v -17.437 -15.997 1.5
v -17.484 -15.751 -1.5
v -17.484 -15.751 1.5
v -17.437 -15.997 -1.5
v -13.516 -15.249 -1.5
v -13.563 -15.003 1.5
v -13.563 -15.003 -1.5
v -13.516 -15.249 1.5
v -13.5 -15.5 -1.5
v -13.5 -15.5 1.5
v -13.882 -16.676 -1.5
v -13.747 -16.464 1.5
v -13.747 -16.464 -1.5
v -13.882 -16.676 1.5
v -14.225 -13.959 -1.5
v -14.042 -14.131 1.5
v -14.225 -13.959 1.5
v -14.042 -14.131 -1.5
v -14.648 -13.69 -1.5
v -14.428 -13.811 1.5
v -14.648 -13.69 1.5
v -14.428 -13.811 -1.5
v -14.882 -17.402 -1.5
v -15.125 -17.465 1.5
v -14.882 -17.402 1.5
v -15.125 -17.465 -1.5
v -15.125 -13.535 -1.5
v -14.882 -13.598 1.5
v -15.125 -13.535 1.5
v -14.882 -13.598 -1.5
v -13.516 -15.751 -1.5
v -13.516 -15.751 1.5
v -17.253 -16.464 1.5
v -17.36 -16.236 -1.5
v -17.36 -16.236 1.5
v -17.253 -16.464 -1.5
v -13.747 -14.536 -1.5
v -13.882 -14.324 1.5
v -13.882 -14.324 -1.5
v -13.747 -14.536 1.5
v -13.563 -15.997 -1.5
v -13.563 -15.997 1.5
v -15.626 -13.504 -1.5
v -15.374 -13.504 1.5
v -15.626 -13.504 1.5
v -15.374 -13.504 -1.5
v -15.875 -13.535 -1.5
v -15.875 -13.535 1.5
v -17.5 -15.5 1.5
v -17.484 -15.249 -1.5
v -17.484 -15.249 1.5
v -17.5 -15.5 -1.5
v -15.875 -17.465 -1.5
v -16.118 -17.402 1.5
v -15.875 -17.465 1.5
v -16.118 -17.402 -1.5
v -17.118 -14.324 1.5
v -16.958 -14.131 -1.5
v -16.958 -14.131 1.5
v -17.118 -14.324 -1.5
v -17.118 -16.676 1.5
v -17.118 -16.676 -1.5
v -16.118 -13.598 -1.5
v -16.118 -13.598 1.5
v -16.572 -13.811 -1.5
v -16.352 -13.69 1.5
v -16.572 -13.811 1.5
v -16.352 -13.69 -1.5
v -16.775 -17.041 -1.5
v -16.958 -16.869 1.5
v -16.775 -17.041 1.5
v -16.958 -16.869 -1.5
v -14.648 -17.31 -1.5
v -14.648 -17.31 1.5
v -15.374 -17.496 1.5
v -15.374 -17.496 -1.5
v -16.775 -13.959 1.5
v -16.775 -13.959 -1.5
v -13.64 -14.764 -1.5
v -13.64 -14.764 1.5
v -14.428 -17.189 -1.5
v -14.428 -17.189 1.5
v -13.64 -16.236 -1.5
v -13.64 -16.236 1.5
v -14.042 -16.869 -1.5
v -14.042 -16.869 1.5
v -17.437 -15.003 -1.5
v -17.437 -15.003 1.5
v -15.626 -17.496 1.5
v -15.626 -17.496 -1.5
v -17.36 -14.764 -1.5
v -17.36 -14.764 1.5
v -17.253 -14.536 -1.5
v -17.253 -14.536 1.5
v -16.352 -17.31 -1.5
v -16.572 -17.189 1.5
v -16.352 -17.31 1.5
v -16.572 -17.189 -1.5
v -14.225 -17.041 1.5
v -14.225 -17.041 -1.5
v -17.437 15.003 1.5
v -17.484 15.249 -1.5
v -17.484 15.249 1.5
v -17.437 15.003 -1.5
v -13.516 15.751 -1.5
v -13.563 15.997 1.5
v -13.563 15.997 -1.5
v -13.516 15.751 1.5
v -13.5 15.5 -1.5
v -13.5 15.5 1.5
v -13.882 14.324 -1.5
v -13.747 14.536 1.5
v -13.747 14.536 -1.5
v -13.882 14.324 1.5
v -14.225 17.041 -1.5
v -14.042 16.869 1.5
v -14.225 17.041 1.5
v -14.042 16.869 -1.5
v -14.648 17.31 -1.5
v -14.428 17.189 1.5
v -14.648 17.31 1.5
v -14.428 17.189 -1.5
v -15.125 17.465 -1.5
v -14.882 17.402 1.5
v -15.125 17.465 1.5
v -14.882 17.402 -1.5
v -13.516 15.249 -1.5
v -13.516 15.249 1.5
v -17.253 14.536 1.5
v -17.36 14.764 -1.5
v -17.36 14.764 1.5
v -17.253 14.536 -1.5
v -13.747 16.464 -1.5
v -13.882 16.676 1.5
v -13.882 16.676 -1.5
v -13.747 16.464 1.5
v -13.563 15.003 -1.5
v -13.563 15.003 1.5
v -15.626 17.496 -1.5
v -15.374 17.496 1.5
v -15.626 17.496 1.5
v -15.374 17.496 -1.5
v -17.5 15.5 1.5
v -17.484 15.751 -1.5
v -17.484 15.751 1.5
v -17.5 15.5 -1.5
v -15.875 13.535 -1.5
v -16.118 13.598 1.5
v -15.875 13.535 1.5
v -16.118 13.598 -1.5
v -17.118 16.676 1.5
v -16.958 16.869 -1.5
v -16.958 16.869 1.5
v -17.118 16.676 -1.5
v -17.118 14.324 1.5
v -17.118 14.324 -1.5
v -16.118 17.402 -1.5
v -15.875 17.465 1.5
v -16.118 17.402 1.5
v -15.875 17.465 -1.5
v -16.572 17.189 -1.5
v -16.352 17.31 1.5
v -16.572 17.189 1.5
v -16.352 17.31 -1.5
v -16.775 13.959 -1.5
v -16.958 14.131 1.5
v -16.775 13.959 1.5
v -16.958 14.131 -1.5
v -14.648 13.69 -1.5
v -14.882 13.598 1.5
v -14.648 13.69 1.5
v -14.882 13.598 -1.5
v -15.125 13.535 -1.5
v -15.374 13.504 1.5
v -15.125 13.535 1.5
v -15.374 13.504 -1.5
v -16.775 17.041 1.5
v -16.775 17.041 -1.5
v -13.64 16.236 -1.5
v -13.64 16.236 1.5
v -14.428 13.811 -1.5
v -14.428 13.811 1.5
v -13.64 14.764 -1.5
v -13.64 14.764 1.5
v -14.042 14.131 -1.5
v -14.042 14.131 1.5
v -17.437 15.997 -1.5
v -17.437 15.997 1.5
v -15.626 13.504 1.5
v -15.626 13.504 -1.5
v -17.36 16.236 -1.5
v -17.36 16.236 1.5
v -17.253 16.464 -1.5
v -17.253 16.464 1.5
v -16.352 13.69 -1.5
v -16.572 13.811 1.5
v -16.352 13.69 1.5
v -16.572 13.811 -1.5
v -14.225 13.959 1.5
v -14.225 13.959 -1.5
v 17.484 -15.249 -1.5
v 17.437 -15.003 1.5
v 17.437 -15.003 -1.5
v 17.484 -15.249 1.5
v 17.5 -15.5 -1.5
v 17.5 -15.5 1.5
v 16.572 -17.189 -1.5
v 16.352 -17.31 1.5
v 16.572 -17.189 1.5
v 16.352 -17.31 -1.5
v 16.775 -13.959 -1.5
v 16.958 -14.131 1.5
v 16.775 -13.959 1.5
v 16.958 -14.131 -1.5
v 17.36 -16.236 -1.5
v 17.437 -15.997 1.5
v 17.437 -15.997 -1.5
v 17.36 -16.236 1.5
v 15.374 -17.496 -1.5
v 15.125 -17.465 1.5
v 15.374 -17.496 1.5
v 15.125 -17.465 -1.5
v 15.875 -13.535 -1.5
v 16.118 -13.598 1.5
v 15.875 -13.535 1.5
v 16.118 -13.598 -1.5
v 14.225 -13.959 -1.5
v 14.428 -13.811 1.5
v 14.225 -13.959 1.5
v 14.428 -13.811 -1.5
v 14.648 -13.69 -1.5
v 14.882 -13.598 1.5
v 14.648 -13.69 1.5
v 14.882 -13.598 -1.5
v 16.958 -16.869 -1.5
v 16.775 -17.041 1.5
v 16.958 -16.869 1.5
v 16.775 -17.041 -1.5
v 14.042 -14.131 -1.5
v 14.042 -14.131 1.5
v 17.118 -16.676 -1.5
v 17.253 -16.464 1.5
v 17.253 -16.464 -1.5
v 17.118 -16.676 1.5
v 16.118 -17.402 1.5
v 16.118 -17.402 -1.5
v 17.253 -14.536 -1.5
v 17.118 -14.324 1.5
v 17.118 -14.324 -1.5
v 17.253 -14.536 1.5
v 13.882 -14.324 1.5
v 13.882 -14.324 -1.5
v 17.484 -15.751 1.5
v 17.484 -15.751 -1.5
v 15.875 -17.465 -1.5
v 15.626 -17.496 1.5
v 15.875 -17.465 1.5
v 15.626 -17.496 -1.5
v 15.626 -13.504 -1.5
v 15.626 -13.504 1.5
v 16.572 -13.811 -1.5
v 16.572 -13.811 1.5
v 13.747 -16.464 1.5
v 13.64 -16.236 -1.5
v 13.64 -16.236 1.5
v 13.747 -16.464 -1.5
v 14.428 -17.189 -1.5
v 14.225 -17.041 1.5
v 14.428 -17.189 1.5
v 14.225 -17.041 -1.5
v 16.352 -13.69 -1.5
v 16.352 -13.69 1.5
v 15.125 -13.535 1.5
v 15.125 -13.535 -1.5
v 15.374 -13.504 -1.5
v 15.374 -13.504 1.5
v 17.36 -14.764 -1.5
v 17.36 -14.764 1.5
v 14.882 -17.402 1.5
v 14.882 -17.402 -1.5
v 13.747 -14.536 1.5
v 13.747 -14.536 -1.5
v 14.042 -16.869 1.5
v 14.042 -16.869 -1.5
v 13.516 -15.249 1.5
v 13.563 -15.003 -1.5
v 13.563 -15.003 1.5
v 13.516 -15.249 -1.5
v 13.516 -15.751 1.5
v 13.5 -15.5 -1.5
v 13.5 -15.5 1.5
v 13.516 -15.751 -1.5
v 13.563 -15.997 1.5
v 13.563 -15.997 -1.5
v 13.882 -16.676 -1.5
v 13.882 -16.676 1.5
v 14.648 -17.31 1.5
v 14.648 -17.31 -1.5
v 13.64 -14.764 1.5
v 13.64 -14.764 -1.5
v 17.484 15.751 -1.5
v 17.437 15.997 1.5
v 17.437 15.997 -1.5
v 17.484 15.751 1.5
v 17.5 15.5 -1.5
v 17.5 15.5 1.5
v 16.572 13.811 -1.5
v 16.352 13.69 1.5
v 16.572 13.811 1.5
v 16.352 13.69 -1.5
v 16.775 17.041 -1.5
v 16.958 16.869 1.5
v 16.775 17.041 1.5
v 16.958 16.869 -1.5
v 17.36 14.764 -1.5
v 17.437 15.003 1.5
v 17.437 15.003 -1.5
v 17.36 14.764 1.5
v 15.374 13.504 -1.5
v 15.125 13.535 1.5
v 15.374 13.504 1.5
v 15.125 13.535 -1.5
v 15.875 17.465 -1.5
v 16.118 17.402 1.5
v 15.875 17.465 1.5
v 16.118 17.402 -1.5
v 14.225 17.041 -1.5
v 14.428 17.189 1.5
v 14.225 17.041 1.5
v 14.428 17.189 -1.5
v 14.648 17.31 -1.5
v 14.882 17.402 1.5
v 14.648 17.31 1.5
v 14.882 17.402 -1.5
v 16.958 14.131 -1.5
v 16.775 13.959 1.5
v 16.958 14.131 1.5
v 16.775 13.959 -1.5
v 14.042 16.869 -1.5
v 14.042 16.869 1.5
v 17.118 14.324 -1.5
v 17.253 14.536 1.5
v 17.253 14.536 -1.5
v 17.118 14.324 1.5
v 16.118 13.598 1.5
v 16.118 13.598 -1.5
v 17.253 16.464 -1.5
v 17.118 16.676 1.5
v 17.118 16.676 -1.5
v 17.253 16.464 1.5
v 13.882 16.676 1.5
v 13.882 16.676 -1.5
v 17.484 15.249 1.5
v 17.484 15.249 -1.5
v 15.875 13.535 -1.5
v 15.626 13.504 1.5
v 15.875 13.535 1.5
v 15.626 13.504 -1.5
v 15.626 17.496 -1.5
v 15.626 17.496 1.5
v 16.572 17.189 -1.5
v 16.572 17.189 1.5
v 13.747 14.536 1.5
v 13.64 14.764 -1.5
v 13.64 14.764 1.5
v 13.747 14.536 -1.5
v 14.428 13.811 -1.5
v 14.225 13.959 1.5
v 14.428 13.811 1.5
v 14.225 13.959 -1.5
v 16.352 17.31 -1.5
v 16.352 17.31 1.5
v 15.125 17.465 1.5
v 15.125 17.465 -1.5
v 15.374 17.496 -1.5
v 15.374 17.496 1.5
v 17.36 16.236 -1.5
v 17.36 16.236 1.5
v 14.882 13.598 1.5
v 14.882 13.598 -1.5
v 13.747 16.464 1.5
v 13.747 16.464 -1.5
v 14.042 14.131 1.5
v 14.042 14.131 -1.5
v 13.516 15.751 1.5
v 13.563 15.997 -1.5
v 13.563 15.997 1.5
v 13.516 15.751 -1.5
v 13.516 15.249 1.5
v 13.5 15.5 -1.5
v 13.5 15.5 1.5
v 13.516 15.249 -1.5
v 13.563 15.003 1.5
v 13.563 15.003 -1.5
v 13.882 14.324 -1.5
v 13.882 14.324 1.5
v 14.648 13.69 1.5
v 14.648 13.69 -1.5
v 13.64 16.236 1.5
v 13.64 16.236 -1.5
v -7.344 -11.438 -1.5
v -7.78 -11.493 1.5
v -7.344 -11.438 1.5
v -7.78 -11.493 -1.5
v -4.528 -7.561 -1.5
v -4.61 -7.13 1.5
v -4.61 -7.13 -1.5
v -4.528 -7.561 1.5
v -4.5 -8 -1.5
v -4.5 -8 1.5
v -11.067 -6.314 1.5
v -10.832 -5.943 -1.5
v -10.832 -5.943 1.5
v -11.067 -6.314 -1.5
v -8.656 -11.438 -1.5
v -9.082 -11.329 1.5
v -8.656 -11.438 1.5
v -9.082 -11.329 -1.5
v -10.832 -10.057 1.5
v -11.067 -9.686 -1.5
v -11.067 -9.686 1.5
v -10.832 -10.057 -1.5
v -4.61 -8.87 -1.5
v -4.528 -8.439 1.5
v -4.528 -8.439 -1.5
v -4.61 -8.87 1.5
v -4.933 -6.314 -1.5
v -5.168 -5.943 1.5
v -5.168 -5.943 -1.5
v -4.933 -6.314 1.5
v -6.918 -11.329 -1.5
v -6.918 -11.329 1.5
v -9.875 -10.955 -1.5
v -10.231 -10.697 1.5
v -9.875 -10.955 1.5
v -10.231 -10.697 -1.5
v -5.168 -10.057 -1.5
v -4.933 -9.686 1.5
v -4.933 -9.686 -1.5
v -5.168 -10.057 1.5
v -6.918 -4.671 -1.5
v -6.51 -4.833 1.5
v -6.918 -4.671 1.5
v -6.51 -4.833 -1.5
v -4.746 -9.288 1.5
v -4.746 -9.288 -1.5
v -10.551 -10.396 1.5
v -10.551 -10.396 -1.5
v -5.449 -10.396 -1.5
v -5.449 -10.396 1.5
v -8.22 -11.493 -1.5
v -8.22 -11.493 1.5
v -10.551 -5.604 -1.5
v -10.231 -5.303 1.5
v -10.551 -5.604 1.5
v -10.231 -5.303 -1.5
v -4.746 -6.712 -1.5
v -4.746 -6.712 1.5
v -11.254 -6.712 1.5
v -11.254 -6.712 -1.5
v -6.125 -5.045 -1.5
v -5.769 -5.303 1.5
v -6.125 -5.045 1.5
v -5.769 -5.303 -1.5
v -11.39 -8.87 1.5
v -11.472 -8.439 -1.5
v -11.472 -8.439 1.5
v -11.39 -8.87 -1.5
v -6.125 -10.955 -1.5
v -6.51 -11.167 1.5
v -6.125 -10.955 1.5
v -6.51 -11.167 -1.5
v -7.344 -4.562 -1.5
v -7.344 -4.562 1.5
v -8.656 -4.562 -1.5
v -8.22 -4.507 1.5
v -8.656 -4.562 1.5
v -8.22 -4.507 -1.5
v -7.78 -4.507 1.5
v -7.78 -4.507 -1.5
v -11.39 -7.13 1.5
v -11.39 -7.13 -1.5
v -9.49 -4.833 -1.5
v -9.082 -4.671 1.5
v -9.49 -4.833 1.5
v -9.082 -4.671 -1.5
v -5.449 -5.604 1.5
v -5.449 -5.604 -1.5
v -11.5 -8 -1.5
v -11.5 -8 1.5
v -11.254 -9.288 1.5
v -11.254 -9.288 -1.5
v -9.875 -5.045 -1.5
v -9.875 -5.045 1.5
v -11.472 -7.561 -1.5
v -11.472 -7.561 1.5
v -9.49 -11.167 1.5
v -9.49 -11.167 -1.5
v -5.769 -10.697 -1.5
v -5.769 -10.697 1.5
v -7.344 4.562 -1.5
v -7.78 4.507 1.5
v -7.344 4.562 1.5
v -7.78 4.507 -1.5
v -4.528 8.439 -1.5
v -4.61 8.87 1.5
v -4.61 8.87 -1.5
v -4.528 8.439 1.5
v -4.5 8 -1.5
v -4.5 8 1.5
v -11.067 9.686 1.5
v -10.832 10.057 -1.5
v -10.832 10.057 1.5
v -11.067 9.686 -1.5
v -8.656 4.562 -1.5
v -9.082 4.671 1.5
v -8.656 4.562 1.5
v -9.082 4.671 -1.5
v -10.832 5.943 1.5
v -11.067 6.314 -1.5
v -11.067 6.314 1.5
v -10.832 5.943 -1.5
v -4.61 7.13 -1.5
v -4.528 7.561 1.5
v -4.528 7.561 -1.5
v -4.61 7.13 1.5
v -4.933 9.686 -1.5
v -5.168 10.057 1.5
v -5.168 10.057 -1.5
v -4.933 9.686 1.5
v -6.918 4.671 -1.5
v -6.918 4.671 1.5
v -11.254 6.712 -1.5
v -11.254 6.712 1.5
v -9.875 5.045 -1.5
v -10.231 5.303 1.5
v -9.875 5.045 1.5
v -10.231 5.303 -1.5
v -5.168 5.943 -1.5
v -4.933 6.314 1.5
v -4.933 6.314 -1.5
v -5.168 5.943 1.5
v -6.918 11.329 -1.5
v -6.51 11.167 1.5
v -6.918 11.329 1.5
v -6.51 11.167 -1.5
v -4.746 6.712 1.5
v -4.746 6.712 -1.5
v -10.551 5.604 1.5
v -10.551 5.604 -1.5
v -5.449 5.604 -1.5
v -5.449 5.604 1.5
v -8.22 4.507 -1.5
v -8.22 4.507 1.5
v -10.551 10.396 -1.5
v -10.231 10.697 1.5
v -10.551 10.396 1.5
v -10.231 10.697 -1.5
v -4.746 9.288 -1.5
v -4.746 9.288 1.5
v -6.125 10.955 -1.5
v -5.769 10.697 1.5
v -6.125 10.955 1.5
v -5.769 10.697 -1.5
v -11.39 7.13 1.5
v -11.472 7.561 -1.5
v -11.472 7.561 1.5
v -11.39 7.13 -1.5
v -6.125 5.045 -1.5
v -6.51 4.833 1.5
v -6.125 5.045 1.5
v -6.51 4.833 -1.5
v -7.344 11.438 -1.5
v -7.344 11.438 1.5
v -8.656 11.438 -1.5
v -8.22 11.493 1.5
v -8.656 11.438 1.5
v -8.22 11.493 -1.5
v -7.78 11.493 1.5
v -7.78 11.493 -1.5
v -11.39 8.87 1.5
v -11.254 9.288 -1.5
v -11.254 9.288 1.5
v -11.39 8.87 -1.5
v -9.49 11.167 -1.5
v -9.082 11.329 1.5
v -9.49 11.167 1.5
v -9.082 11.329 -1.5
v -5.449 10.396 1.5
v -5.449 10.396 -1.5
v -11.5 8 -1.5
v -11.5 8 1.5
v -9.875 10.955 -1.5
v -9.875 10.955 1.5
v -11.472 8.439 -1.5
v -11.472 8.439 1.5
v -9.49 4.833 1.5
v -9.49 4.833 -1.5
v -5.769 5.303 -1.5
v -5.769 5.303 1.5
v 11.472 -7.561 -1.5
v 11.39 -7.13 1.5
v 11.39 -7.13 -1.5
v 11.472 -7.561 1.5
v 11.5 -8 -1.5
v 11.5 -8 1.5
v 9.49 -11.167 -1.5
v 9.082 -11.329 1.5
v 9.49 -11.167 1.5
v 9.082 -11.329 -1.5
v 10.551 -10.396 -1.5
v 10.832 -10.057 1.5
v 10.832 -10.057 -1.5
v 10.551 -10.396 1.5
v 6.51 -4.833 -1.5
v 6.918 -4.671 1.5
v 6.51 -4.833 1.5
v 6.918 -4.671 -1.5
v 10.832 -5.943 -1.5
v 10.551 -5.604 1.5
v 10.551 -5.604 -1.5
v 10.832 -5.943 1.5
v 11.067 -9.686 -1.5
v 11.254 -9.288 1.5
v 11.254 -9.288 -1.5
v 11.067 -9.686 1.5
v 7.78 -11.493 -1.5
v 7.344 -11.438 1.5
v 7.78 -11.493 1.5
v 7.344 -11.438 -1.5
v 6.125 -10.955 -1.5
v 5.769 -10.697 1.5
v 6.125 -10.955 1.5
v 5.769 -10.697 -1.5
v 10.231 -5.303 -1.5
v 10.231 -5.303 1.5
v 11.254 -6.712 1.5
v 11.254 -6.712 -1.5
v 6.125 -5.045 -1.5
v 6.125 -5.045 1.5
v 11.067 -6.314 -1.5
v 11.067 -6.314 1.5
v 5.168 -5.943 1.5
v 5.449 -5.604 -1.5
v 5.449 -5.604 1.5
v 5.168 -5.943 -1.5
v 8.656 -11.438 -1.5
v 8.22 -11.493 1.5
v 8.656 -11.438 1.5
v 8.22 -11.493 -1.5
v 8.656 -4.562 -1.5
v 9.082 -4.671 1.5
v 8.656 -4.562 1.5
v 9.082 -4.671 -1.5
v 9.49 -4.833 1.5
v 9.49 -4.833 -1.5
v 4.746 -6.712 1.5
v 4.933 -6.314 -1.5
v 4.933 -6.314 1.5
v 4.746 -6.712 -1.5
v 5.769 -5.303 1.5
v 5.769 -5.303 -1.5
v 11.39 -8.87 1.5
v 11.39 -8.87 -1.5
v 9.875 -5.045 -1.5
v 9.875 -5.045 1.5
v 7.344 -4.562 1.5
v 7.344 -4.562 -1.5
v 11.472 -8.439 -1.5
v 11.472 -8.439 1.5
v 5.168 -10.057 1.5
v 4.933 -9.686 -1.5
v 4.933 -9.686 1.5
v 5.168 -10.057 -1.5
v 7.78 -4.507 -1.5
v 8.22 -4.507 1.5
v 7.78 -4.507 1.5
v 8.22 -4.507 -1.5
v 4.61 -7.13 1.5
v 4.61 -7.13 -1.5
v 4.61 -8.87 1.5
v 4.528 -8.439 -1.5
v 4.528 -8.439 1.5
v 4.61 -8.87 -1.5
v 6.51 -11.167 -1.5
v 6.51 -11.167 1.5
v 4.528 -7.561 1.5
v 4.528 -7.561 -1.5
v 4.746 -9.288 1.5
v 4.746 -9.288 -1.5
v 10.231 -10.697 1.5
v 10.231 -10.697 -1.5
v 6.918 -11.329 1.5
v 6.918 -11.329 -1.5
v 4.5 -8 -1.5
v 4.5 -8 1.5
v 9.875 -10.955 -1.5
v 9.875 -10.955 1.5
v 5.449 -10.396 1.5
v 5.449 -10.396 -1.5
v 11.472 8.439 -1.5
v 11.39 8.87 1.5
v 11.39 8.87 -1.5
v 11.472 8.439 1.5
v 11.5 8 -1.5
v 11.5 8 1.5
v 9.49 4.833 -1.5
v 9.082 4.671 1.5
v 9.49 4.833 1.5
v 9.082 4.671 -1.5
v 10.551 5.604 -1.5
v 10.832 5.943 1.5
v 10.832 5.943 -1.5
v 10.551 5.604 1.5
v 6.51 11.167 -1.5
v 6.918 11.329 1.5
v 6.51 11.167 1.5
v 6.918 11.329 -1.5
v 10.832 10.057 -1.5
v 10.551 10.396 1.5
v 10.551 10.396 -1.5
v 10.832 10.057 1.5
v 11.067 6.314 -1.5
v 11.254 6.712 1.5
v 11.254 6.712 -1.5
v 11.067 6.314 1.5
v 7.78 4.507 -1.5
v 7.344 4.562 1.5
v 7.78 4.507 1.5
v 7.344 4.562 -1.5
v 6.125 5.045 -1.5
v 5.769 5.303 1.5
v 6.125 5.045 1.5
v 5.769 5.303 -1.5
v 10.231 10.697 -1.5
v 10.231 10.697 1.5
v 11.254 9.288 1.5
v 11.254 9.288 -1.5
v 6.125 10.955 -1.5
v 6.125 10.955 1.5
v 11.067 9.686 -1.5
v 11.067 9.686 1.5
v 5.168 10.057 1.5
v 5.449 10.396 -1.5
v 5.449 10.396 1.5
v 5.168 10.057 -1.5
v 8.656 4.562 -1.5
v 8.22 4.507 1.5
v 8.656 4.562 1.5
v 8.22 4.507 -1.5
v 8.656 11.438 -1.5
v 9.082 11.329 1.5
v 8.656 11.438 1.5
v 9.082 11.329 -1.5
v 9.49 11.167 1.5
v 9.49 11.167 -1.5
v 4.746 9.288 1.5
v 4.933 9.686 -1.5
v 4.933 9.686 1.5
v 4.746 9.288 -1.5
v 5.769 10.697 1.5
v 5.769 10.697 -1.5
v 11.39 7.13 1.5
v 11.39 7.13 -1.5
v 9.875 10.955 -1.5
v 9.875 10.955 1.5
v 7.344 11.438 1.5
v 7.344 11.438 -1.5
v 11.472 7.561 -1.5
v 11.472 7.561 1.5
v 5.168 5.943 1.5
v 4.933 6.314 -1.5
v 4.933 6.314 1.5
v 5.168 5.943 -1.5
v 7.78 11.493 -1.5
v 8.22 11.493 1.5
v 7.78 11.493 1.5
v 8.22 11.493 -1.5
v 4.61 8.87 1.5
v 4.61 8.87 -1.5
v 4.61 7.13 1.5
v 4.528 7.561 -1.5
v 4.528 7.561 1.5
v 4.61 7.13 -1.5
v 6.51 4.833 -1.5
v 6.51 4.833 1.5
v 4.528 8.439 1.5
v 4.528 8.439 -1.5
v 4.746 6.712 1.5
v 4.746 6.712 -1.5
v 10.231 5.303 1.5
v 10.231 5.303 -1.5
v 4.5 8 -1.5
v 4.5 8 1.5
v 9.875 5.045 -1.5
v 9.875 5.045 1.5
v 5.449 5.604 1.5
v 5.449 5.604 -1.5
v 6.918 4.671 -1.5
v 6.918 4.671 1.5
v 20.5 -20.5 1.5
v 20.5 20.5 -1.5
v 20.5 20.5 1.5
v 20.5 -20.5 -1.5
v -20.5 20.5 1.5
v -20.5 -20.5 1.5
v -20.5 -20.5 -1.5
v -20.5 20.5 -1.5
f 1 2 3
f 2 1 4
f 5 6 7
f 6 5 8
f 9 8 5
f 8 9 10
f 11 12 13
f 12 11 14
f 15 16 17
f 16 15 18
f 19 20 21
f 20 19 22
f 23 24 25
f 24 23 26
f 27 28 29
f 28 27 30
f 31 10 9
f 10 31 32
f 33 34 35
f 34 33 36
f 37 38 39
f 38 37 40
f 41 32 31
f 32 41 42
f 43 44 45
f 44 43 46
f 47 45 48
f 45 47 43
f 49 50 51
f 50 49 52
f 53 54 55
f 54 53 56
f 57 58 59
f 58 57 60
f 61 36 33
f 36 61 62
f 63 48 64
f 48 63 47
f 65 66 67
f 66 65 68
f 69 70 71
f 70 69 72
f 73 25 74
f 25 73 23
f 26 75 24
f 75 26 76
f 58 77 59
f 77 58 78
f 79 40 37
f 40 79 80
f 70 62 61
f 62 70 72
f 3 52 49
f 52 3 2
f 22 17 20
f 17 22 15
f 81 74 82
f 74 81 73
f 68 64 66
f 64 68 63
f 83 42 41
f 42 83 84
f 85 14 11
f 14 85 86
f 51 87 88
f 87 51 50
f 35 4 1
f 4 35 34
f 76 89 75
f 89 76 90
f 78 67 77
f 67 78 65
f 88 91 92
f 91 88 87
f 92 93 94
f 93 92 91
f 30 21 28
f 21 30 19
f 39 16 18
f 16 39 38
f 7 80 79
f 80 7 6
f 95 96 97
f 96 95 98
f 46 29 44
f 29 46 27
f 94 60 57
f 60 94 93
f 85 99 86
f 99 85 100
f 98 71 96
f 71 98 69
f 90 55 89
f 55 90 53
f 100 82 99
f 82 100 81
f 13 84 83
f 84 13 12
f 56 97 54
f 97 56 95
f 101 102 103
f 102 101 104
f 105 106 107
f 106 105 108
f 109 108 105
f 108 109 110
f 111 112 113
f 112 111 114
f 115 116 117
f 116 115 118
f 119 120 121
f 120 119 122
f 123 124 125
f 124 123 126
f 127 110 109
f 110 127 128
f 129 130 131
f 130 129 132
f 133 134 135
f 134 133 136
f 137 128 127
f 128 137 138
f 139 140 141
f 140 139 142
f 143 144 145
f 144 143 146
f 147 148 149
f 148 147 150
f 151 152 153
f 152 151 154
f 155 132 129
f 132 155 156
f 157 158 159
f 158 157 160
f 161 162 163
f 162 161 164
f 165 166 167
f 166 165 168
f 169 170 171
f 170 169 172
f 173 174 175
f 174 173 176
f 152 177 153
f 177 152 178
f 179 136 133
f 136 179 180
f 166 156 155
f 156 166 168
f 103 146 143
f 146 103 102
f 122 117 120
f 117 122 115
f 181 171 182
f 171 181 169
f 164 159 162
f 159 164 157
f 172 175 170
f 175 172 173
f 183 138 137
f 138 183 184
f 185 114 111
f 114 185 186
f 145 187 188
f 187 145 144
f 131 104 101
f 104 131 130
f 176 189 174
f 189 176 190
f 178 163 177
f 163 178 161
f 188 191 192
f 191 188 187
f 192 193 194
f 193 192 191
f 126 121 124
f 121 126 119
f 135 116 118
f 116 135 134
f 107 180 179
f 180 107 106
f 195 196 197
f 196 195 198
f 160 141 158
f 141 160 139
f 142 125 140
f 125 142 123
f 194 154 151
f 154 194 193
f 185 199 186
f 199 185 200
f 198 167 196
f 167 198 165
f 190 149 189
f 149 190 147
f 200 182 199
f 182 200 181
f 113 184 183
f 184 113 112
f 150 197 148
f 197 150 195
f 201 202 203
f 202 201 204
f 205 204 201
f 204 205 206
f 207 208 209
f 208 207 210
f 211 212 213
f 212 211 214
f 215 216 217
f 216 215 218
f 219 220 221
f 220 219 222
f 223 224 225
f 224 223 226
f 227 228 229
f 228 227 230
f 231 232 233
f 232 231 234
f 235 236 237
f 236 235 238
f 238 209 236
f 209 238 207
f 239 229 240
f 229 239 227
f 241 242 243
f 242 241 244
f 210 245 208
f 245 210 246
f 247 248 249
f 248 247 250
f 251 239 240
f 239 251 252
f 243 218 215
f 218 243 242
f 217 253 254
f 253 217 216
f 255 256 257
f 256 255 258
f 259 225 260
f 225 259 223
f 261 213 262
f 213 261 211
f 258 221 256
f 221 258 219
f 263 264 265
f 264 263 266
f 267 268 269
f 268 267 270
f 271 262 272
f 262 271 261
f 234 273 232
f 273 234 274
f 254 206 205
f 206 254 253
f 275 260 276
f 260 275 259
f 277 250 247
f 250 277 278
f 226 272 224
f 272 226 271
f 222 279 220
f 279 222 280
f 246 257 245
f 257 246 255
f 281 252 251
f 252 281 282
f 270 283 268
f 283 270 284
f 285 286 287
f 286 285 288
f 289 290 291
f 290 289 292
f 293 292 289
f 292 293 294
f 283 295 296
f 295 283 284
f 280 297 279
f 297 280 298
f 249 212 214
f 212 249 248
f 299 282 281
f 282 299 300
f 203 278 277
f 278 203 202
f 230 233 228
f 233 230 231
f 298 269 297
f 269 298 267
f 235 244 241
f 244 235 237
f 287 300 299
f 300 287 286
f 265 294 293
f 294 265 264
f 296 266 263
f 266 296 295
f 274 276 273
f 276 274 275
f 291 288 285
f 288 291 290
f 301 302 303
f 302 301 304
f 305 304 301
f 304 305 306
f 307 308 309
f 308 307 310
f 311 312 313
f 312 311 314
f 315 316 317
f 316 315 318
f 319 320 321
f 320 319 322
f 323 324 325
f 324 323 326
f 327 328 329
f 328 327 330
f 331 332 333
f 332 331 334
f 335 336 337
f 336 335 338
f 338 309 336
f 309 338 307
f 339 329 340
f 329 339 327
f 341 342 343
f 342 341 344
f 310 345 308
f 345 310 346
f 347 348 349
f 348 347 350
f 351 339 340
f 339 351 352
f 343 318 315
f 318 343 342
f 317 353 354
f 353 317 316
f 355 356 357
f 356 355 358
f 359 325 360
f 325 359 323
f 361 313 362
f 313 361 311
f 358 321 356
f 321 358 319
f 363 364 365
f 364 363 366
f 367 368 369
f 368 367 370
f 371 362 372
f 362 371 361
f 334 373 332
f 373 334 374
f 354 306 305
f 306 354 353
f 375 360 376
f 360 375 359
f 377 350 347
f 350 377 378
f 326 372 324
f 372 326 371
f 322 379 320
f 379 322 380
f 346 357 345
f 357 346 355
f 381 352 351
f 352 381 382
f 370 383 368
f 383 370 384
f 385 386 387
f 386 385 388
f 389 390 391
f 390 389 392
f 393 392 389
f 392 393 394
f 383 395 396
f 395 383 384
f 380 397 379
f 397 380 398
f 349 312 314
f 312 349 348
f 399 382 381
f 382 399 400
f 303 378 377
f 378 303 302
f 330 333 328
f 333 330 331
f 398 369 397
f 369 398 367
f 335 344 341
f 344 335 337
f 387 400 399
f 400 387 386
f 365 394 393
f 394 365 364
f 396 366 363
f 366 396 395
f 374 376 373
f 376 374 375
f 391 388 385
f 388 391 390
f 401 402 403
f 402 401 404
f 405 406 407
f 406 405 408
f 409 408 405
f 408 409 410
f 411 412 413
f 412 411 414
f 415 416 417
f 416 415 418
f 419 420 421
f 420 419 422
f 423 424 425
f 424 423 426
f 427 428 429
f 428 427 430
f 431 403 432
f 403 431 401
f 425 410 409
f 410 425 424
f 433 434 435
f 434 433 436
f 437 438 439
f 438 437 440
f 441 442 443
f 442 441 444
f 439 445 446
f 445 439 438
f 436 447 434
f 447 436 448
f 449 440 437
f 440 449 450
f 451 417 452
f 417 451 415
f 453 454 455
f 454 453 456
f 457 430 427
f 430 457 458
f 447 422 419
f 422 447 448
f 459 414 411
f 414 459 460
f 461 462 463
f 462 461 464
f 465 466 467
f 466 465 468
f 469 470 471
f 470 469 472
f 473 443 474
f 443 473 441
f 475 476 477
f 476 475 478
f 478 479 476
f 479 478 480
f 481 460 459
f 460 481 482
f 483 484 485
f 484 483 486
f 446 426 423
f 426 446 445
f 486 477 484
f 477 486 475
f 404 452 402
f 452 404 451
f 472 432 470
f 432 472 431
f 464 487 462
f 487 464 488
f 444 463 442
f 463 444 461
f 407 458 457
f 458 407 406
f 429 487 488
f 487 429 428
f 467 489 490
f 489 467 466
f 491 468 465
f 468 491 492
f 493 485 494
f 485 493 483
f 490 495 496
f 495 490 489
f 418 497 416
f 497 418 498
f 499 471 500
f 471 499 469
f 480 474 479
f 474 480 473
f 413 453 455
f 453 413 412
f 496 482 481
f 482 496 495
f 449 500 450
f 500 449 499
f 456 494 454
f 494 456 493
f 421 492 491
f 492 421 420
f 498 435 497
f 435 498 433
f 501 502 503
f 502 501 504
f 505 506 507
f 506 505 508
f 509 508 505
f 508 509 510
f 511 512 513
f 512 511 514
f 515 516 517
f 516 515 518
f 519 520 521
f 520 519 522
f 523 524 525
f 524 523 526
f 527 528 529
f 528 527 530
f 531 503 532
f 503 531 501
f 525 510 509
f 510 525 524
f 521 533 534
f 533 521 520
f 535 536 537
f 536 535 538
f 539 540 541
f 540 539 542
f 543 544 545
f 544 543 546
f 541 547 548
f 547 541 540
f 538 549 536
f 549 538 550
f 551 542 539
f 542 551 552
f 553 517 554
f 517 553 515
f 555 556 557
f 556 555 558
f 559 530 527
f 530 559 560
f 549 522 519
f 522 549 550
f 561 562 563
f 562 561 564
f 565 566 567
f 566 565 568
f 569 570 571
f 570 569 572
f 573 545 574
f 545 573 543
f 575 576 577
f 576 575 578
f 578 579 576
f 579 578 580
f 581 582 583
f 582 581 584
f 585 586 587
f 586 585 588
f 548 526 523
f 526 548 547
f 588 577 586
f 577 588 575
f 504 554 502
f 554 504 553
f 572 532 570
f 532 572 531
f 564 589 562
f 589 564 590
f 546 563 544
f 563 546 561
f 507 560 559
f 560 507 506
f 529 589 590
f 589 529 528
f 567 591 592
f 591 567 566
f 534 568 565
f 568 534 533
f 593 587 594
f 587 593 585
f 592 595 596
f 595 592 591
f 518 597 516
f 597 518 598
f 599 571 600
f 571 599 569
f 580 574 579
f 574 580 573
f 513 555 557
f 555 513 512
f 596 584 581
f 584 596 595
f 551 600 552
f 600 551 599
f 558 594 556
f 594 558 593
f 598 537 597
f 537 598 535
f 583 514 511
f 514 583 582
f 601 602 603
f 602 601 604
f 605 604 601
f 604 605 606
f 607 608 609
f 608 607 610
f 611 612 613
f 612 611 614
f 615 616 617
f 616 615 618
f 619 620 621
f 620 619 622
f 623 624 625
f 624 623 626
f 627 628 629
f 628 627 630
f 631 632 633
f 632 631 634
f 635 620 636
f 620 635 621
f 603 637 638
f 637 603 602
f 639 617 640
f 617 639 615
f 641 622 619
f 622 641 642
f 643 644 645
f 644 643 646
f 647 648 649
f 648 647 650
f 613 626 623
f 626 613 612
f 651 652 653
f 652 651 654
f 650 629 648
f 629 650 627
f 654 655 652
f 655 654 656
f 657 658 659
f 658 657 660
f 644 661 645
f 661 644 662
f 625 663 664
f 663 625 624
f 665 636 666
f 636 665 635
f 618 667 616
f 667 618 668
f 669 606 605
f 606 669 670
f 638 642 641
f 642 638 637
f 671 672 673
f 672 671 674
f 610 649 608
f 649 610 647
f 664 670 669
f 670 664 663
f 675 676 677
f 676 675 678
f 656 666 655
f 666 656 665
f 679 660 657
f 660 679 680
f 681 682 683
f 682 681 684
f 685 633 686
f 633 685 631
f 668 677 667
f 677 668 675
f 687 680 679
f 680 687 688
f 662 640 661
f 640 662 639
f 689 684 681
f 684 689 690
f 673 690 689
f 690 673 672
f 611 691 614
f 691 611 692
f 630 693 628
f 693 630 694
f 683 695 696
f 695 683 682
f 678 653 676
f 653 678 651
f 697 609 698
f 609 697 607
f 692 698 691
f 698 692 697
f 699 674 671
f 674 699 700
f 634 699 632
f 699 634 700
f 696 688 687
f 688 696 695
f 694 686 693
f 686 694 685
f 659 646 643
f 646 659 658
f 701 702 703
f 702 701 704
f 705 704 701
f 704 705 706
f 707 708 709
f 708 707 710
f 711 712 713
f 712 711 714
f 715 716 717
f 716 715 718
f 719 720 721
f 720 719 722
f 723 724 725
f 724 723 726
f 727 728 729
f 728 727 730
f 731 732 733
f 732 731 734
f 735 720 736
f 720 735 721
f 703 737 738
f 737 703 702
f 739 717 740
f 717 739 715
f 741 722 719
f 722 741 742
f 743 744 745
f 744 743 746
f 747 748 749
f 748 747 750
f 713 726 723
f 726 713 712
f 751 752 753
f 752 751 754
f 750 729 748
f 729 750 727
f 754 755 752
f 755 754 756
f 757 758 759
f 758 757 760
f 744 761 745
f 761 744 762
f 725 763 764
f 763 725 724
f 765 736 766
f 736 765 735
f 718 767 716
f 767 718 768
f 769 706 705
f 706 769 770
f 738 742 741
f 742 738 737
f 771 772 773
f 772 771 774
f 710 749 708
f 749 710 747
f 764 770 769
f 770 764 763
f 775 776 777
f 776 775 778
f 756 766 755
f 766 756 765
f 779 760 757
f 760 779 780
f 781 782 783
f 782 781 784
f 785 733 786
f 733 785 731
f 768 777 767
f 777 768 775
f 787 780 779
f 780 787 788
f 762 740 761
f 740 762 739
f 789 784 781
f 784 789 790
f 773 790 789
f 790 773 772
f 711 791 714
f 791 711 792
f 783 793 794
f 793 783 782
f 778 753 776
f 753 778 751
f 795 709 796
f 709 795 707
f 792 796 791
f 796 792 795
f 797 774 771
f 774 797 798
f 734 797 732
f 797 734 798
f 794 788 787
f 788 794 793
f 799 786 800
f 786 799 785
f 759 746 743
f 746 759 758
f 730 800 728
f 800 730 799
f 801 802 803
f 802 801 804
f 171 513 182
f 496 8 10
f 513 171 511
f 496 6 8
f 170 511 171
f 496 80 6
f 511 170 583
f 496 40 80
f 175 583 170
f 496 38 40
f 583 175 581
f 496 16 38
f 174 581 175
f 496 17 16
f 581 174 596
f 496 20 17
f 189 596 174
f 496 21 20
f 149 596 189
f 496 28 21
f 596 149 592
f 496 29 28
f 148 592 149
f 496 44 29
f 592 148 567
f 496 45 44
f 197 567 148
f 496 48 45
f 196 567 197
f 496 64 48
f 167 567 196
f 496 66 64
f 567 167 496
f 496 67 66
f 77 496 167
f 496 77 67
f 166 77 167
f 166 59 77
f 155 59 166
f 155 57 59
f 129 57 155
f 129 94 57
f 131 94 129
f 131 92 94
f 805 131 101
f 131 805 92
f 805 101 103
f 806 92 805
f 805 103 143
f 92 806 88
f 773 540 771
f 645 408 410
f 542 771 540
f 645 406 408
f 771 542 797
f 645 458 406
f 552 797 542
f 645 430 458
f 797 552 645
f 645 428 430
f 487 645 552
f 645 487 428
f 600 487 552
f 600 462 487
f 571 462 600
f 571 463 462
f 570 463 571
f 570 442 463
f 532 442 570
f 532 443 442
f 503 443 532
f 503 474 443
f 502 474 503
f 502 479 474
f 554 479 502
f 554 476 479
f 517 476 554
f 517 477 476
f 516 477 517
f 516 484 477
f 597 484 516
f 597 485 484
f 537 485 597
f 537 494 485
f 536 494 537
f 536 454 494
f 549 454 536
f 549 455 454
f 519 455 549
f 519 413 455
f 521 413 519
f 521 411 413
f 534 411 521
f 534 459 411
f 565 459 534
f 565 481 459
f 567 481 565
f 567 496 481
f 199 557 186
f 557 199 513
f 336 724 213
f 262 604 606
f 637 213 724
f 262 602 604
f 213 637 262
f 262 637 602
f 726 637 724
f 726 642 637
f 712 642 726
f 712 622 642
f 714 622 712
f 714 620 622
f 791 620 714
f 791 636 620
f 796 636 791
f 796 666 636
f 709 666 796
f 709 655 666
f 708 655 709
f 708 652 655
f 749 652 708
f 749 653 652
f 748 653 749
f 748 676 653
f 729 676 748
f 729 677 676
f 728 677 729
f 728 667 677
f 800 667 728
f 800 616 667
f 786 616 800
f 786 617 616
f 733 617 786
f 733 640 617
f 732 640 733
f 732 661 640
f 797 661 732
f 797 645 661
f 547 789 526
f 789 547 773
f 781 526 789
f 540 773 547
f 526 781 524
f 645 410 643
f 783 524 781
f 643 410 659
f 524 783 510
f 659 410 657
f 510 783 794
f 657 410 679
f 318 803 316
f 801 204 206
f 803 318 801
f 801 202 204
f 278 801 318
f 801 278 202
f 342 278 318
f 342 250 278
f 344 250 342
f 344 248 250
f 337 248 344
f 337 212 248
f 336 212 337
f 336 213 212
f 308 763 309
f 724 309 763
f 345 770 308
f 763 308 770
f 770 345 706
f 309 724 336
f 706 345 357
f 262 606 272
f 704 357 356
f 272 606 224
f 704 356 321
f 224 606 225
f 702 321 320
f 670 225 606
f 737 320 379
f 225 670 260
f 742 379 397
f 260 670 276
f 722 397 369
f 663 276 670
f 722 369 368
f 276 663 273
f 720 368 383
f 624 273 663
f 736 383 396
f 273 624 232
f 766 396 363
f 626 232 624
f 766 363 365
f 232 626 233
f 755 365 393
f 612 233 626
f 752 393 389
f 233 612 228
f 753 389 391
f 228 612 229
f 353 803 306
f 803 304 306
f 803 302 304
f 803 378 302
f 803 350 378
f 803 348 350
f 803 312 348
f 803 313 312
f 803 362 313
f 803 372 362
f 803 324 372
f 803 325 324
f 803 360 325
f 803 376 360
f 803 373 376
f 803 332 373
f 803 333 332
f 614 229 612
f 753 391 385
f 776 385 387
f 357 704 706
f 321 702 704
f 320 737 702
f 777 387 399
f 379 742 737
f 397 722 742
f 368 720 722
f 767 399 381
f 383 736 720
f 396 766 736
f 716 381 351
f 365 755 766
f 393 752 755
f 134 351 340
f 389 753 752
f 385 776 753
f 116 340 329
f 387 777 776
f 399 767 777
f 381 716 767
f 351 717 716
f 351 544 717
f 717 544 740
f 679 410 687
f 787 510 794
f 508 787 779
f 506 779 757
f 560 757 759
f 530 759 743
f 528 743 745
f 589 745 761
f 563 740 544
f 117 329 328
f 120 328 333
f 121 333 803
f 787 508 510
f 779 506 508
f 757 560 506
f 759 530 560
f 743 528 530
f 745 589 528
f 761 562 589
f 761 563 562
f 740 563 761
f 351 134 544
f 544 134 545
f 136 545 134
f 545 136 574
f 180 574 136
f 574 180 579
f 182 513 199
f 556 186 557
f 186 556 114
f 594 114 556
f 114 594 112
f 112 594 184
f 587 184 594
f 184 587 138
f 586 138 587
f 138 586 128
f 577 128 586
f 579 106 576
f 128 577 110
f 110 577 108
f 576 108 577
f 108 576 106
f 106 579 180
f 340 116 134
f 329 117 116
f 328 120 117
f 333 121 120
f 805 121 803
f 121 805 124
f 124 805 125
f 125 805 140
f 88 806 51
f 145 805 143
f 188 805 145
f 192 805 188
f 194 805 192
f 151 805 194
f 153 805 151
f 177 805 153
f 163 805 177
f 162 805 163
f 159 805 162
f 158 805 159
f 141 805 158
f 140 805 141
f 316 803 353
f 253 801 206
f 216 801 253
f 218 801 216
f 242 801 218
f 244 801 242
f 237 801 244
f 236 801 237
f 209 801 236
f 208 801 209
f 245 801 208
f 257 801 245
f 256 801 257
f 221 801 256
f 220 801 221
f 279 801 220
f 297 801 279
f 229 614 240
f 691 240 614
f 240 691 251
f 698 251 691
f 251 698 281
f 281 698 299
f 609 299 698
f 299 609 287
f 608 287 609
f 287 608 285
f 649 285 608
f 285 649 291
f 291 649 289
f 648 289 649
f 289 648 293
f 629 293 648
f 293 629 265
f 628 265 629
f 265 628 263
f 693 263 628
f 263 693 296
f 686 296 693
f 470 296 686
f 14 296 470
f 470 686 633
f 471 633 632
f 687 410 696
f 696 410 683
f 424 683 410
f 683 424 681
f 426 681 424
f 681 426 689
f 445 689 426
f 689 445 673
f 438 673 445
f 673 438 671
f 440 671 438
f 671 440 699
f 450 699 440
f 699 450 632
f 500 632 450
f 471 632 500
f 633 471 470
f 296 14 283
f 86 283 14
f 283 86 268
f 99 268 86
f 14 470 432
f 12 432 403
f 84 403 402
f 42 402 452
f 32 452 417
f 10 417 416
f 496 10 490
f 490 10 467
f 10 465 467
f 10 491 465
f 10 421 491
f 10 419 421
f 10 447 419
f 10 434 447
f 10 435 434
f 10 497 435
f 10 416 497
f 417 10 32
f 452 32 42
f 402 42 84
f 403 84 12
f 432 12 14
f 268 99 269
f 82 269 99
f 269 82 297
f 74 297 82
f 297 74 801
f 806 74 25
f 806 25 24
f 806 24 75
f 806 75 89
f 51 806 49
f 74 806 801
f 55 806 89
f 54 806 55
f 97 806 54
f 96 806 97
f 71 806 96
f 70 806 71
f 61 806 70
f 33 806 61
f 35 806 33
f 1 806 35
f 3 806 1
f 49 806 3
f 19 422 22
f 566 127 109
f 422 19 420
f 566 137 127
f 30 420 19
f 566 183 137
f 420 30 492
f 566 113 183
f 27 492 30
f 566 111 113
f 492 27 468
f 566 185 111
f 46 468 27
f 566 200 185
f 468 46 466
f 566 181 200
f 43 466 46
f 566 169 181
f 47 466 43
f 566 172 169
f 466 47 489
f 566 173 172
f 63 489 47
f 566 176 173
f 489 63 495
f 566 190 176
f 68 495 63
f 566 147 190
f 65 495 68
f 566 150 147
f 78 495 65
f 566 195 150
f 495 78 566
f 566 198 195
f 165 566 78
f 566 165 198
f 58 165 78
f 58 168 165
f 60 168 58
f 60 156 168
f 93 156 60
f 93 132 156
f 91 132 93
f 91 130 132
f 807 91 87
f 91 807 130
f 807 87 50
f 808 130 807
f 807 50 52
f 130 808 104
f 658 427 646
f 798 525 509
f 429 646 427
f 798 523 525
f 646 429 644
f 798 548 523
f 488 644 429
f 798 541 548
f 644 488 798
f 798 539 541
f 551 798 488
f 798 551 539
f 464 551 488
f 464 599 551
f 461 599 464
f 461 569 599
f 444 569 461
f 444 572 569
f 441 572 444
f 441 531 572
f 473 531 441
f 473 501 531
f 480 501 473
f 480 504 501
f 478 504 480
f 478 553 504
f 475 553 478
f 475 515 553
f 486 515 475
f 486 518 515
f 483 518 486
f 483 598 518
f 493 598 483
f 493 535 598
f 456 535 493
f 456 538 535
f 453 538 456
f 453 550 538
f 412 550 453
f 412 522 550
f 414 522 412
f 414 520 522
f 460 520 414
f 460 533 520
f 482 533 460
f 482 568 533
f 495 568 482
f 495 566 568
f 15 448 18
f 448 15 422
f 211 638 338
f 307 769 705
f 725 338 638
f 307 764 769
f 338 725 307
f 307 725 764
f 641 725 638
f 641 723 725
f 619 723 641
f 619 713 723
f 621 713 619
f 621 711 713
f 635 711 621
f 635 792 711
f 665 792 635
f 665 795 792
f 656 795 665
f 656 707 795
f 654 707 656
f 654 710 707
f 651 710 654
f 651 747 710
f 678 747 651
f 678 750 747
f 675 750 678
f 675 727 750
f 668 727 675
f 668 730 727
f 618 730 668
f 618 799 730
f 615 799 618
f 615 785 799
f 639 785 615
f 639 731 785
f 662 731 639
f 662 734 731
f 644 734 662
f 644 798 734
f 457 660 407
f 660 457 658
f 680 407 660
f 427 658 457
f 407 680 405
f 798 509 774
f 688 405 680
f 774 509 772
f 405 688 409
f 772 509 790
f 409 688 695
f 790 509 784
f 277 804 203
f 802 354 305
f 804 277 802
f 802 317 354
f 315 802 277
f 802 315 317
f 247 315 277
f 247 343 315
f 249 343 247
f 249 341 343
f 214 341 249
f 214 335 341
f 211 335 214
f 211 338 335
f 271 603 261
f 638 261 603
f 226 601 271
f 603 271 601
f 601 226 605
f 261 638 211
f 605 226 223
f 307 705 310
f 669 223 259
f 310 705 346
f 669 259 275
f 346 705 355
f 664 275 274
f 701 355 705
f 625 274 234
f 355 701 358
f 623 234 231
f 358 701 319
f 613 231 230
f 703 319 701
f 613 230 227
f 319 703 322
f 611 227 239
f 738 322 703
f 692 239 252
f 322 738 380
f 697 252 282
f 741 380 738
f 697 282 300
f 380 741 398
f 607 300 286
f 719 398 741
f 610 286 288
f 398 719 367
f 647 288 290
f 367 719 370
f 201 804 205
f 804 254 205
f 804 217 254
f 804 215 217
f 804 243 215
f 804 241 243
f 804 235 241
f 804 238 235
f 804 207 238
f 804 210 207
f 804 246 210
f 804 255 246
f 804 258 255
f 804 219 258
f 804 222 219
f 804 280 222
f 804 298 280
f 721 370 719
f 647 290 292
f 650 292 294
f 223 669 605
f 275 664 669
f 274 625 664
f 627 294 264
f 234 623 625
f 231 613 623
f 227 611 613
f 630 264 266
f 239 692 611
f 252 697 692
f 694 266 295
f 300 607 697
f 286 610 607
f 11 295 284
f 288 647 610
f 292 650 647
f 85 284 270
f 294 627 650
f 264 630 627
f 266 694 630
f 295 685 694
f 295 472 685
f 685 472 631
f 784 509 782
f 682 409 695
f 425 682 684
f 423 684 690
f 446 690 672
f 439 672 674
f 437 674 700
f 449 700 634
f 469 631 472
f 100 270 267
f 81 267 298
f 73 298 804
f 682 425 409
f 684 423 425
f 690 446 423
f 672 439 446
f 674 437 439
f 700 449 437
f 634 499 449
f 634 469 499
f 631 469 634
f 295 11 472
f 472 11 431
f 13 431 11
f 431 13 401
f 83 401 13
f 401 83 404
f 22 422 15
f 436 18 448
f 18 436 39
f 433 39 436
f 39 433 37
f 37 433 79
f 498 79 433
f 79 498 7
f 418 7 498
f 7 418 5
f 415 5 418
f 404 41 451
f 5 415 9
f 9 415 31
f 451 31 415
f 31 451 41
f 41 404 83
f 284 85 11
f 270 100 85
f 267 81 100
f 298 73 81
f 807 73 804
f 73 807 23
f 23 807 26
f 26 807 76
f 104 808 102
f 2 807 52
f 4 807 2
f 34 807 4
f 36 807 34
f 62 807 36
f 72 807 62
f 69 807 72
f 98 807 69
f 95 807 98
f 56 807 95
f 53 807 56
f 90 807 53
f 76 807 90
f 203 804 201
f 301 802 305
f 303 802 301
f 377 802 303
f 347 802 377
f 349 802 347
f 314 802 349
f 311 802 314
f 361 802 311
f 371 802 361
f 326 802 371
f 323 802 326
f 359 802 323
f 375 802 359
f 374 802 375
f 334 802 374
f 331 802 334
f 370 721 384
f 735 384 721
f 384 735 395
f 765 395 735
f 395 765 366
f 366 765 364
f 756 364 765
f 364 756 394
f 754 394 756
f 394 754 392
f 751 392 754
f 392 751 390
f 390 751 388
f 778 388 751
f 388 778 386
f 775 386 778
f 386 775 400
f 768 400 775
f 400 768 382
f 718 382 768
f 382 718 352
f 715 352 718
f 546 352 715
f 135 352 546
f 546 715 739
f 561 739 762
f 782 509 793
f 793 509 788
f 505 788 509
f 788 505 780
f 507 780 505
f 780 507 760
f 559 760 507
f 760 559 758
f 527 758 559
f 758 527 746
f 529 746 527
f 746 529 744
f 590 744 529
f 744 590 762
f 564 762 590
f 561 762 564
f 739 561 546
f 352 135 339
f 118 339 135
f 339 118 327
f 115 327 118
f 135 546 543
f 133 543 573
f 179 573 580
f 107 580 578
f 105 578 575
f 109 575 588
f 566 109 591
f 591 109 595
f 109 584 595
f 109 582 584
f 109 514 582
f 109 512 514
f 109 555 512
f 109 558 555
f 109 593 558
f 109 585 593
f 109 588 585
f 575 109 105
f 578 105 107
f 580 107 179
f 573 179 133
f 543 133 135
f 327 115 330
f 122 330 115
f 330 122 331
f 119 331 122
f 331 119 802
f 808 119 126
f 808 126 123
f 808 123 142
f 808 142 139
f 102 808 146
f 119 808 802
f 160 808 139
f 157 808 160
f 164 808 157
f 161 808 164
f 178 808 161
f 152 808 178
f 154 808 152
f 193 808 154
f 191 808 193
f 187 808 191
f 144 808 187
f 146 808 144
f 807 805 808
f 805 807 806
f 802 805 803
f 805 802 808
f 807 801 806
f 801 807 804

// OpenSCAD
$fn=50;

difference() {
    cube( [41,41,3], center=true ); 
    for (i=[-1,1]) {
        for (j=[-1,1]) {
            translate( [15.5*i, 15.5*j, 0 ] ) cylinder( r=2, h=20, center=true ); // motor mounting holes
        }   
  }
    for (i=[-1,1]) { 
        for (j=[-1,1]) {
            translate( [8*i, 8*j, 0] ) cylinder( r=3.5, h=20, center=true ); // holes
            //translate( [8*i, 8*j, -3] ) cube( [18,9,4], center=true ); // head bays 
        }
    }
    
}
